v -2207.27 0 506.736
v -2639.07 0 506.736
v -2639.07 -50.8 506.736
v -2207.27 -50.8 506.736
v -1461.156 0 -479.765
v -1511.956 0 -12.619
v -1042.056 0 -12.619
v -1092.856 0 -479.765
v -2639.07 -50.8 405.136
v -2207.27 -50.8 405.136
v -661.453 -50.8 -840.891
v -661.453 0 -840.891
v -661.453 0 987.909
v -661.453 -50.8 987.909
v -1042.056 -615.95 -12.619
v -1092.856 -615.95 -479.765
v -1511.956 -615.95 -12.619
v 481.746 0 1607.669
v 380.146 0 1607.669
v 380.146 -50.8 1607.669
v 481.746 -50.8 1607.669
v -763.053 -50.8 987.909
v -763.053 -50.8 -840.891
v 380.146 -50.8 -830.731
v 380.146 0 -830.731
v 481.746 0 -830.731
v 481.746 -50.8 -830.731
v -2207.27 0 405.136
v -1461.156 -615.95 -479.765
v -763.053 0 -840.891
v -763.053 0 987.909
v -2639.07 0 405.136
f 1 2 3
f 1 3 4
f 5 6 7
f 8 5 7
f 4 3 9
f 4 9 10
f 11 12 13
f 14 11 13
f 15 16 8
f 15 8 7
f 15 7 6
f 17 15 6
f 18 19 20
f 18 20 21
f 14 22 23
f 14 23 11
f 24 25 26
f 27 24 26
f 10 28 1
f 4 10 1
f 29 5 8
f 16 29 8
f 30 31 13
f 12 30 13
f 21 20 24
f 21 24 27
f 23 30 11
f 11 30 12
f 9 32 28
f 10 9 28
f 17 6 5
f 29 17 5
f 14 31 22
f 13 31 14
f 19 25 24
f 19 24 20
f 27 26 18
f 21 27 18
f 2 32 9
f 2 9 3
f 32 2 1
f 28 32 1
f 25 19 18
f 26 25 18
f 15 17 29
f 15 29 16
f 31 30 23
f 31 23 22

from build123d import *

# Parameters (mm, degrees)
F0_W     = 101.6
F0_H     = 1828.8
F1_DEPTH = 50.8
F0_H_2   = 2438.4
F2_DEPTH = 50.8
F3_DEPTH = 615.95
F0_W_2   = 431.8
F0_H_3   = 101.6
F4_DEPTH = 50.8


with BuildPart() as f1:
    # F0 (on Front) → F1 (new body)
    with BuildSketch(Plane.XZ):
        with Locations((-712.252872, 73.5089)):
            Rectangle(F0_W, F0_H)
    extrude(amount=F1_DEPTH)


with BuildPart() as f2:
    # F0 (on Front) → F2 (new body)
    with BuildSketch(Plane.XZ):
        with Locations((430.945997, 388.469025)):
            Rectangle(F0_W, F0_H_2)
    extrude(amount=F2_DEPTH)


with BuildPart() as f3:
    # F0 (on Front) → F3 (new body)
    with BuildSketch(Plane.XZ):
        Polygon((-1042.055543, -12.618615), (-1511.955543, -12.618615), (-1461.155543, -479.764599), (-1092.855543, -479.764599), align=None)
    extrude(amount=F3_DEPTH)


with BuildPart() as f4:
    # F0 (on Front) → F4 (new body)
    with BuildSketch(Plane.XZ):
        with Locations((-2423.169557, 455.936019)):
            Rectangle(F0_W_2, F0_H_3)
    extrude(amount=F4_DEPTH)


solid = Compound([f1.part, f2.part, f3.part, f4.part])
